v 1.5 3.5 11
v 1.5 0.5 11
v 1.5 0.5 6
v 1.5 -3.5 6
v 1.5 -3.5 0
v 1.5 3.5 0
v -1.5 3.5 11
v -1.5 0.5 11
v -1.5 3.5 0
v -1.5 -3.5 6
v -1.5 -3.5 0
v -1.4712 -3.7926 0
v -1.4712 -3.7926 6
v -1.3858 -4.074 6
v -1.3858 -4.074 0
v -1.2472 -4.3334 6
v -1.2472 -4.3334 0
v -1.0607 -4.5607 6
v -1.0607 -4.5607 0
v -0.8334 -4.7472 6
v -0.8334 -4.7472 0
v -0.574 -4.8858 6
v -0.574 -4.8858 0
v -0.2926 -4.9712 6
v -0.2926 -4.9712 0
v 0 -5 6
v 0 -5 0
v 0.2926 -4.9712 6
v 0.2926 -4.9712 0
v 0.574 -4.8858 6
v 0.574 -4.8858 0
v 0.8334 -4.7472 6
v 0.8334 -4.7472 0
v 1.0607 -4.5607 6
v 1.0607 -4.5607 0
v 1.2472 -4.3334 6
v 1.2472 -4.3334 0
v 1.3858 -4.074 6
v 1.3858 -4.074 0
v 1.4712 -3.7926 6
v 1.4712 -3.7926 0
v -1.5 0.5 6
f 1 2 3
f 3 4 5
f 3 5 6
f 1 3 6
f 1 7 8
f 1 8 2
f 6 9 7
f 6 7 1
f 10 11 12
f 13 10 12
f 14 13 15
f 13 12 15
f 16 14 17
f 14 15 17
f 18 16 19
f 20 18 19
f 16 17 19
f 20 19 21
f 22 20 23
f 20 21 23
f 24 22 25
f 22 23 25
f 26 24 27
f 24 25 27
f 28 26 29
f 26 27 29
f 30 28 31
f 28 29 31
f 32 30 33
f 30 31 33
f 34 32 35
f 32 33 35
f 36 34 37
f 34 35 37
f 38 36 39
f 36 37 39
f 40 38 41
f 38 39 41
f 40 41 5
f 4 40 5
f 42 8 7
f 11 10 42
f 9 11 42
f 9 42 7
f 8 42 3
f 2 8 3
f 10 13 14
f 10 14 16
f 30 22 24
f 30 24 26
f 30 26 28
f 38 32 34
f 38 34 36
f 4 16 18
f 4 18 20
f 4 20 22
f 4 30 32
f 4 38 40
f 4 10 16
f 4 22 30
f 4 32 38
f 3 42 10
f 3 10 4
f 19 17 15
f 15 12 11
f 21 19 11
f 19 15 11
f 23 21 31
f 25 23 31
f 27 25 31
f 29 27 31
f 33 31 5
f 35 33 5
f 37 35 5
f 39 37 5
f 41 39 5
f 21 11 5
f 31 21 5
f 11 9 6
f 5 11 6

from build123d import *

# Parameters (mm, degrees)
BOSS_EXTRUDE1_DEPTH = 6
SKETCH1_3_W         = 3
SKETCH1_3_H         = 3
BOSS_EXTRUDE2_DEPTH = 11


with BuildPart() as part:
    # Sketch1 → Boss-Extrude1 (new body)
    with BuildSketch(Plane.XY):
        with BuildLine():
            Line((1.5, 0.5), (-1.5, 0.5))
            Line((-1.5, 0.5), (-1.5, -3.5))
            ThreePointArc((-1.5, -3.5), (0, -5), (1.5, -3.5))
            Line((1.5, -3.5), (1.5, 0.5))
        make_face()
    extrude(amount=BOSS_EXTRUDE1_DEPTH)

    # Sketch1<3> → Boss-Extrude2 (add)
    with BuildSketch(Plane.XY):
        with Locations((0, 2)):
            Rectangle(SKETCH1_3_W, SKETCH1_3_H)
    extrude(amount=BOSS_EXTRUDE2_DEPTH)


solid = part.part
